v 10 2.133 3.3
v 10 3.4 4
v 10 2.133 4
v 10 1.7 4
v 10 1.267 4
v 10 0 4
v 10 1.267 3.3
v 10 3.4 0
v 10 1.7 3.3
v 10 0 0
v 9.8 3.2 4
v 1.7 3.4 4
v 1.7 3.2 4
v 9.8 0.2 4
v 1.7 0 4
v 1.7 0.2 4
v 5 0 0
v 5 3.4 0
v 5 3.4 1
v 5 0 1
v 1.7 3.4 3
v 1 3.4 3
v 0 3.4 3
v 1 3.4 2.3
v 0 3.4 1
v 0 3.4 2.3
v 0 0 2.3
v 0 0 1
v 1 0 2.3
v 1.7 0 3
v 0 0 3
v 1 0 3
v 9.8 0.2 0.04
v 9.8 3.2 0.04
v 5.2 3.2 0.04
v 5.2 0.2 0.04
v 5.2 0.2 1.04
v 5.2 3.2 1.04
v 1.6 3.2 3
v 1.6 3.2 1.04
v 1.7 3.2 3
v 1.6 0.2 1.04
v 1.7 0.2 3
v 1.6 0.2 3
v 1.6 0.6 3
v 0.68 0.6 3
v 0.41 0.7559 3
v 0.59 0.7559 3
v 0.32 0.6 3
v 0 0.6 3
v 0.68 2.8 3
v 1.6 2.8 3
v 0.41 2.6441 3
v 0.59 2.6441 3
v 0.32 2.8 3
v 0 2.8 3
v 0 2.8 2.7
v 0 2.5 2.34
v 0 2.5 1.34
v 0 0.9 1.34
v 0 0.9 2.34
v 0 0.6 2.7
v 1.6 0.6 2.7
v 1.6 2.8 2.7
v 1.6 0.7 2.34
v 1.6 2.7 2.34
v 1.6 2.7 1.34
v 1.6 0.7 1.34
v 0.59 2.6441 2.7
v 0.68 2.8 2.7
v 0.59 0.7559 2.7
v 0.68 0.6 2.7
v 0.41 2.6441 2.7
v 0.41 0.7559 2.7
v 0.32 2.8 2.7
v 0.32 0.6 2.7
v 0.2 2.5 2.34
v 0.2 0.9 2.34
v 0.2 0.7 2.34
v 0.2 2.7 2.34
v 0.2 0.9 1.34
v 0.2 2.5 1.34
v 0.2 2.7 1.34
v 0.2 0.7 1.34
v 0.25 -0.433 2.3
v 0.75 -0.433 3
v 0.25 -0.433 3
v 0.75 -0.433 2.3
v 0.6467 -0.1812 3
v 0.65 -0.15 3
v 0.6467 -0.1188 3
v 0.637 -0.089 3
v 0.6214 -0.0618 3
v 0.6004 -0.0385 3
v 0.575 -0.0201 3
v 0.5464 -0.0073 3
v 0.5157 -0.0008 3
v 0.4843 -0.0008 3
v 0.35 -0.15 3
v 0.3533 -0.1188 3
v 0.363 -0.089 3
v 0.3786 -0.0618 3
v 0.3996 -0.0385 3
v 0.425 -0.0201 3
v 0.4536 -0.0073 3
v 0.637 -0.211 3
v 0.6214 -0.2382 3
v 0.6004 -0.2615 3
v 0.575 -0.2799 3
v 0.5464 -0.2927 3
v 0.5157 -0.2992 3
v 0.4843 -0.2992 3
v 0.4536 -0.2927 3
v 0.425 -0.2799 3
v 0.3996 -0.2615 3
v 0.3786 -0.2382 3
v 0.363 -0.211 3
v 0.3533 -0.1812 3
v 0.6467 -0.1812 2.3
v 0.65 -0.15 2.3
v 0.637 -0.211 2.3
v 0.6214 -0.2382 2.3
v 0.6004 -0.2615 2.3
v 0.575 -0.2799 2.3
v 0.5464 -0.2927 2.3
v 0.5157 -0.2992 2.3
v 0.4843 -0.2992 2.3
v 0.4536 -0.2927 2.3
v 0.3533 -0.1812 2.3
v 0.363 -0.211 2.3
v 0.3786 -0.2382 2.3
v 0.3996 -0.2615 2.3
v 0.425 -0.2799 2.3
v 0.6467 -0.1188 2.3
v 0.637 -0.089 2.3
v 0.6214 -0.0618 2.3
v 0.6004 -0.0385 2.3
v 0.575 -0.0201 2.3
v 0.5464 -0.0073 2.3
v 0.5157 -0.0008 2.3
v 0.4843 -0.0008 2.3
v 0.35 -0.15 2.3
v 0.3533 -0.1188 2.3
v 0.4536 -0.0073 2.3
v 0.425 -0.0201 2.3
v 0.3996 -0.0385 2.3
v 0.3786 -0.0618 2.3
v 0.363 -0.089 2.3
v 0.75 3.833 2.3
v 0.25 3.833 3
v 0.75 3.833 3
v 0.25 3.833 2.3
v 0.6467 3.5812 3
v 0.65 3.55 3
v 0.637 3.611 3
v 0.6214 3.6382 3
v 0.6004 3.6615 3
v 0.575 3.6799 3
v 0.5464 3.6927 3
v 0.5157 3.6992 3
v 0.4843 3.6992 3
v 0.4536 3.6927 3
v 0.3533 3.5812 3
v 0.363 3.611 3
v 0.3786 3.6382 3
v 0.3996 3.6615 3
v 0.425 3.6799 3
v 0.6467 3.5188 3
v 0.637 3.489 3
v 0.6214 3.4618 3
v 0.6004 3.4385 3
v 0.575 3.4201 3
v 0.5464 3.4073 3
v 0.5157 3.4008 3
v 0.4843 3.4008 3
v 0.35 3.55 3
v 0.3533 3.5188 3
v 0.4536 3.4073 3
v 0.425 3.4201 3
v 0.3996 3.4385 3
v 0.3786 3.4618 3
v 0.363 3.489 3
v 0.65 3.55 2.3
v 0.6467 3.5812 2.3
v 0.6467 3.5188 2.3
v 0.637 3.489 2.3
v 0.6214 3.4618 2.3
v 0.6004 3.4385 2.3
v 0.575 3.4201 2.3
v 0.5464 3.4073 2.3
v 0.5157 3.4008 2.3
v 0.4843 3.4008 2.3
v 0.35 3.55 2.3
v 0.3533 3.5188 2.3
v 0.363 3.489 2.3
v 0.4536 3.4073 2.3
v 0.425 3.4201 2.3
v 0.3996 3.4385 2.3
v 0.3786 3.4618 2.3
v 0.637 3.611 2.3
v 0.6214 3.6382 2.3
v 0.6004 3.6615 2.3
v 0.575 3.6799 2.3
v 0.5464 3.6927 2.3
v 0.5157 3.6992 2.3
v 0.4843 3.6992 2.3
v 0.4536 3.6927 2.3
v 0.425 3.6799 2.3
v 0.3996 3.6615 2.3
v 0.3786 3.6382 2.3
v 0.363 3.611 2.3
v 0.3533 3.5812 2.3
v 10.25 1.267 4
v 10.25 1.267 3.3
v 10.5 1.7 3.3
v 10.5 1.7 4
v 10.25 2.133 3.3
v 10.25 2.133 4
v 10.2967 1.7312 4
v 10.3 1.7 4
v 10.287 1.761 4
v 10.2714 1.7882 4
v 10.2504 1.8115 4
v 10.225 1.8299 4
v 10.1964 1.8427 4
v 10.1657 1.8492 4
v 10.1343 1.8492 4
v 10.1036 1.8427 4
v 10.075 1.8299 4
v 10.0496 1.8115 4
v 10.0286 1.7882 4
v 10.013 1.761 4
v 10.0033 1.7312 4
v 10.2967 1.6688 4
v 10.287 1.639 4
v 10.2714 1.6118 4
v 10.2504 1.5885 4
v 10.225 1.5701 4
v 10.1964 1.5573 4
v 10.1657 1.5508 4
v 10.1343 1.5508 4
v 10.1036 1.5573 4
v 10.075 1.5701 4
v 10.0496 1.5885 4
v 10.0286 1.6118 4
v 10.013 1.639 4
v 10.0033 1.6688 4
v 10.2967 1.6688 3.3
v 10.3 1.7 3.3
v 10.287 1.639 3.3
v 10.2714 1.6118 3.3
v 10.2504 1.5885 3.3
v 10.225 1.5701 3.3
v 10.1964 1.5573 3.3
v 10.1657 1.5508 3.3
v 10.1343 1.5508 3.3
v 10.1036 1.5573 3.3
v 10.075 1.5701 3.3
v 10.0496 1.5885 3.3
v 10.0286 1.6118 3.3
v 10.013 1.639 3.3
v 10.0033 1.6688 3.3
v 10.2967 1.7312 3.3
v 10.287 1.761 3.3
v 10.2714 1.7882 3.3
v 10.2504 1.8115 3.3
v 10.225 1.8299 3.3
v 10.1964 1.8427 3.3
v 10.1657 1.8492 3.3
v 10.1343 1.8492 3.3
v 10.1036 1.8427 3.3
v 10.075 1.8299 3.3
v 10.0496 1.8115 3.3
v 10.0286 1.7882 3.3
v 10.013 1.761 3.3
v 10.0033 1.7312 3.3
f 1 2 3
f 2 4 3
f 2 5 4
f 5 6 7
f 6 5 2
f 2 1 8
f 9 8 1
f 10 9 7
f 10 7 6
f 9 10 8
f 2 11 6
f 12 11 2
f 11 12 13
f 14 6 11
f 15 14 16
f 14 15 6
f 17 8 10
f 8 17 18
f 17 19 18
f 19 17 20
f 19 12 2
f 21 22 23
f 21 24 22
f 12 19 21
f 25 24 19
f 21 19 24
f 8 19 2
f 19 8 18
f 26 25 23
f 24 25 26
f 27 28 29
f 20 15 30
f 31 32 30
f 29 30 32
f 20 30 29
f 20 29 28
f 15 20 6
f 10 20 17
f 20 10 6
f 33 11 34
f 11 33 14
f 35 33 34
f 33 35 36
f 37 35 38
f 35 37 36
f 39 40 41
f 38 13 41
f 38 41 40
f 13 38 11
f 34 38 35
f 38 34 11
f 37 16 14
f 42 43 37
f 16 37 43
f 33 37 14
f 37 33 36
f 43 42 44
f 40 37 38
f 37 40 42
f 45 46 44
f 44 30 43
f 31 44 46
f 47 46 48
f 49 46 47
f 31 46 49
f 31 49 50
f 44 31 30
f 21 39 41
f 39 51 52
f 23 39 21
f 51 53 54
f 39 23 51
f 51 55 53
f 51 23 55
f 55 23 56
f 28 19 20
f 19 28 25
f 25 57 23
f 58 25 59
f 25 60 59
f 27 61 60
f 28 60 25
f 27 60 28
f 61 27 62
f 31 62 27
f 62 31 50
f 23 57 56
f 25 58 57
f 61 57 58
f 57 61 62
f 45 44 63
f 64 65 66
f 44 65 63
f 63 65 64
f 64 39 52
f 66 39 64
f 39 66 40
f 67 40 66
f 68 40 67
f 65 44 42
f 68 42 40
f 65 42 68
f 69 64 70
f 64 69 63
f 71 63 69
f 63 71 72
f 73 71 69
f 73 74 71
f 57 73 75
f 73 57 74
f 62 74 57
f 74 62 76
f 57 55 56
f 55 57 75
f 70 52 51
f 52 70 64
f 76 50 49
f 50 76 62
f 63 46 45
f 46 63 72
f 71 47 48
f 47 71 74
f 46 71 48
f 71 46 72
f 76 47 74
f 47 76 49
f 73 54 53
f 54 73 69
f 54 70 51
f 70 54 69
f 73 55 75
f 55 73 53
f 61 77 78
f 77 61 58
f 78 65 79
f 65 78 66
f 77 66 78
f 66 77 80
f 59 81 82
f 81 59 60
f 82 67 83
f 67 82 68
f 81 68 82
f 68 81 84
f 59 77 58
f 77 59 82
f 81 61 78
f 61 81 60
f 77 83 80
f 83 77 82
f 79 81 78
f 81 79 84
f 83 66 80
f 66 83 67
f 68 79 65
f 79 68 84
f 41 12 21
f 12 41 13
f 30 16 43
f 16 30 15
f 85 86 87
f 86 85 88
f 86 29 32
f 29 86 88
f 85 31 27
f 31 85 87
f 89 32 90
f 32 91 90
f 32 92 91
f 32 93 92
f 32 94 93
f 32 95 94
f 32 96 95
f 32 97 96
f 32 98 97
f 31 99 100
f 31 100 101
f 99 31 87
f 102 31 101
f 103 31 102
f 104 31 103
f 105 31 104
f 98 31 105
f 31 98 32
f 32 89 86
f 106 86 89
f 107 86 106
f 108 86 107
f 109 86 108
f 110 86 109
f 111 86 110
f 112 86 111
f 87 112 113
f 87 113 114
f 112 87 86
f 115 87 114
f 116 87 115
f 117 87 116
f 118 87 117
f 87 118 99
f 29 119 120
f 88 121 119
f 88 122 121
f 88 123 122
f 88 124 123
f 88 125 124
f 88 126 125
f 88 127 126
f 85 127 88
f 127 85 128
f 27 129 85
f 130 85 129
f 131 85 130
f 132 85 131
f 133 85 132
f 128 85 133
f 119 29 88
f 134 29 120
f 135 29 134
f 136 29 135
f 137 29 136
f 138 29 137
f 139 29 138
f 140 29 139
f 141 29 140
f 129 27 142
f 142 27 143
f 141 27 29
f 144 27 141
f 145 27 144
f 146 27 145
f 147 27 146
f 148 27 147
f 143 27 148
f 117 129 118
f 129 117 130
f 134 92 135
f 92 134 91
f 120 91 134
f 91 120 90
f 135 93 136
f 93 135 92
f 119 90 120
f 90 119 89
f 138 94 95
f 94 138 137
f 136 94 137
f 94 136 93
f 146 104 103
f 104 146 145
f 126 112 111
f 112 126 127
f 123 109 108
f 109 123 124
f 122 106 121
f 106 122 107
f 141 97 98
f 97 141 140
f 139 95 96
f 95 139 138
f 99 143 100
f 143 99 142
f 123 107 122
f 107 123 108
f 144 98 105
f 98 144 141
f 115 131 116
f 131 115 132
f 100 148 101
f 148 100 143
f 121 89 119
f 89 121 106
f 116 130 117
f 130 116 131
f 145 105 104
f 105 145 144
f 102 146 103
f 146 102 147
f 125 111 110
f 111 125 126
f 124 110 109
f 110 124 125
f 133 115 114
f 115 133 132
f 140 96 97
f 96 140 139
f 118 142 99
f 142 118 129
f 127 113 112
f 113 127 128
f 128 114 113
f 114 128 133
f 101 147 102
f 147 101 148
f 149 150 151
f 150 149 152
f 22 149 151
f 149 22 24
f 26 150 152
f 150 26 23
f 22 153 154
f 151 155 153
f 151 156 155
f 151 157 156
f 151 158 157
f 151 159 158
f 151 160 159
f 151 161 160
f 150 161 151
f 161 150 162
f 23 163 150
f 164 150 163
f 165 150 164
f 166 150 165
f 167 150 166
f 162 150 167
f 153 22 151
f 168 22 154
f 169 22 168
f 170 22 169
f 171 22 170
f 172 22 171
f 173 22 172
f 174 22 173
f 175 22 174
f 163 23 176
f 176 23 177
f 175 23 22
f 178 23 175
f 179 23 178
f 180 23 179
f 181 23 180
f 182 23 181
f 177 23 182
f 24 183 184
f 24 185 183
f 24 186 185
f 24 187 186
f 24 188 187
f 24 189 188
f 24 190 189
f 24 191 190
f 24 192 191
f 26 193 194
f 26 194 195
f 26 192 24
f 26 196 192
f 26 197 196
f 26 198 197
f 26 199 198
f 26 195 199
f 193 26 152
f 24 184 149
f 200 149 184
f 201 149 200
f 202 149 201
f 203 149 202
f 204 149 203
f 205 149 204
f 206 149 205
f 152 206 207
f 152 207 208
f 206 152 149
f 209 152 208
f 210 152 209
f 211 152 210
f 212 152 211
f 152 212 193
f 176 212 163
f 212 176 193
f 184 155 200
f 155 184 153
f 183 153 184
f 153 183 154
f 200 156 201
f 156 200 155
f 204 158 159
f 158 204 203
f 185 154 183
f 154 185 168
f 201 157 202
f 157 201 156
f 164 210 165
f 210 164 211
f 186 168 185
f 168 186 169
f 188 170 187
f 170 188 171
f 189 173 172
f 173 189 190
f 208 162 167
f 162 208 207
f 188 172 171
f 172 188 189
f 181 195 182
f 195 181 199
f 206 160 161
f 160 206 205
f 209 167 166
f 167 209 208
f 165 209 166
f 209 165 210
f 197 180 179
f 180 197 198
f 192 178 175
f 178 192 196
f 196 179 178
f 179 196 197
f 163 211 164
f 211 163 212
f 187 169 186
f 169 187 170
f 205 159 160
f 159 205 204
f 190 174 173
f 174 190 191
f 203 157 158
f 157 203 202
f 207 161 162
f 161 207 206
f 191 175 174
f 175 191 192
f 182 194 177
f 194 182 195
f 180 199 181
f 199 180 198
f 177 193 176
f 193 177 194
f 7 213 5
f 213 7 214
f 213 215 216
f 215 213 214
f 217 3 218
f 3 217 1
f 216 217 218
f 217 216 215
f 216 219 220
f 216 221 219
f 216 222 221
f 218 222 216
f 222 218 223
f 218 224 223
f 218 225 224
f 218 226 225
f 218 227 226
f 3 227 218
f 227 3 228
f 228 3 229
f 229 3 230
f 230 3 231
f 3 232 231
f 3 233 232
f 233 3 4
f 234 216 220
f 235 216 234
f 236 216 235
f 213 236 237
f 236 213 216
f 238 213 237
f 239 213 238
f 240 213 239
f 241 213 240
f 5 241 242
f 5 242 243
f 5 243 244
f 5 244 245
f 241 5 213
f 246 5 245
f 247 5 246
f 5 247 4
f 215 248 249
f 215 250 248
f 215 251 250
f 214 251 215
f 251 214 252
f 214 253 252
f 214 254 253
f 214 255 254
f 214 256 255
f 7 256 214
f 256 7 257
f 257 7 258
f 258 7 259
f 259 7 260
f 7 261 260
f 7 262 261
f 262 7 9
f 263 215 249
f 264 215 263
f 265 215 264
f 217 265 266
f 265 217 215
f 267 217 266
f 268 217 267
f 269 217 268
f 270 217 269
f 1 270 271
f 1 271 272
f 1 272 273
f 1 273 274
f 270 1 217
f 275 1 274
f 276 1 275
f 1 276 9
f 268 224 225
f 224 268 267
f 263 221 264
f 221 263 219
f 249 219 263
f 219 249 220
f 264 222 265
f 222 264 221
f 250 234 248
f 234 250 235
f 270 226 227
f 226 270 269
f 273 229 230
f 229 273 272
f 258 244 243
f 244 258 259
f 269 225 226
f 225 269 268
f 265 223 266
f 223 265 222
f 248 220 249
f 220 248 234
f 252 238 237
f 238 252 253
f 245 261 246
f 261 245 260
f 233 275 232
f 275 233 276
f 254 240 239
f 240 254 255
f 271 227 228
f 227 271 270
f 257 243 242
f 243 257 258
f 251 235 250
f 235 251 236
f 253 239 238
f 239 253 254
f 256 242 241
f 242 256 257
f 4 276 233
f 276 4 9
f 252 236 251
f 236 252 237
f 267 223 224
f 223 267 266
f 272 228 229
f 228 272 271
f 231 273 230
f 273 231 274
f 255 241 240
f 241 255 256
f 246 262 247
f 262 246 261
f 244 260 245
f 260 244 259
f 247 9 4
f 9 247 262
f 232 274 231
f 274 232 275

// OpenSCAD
//color("azure",0.25) cube([8.7,2.9,4.1]);

module sensor() {
    translate([-6,0,0]) cube([8,2.2,0.2,]);
    translate([0.5,0,0]) cylinder(0.2,r=0.2,false,$fn=6);
    translate([0.5,2.2,0]) cylinder(0.2,r=0.2,false,$fn=6);
}



module bottom() {
    difference() {
        translate([-0.4,-0.2,-1.2]) cube([9  ,2.6,1.1]);
        translate([0   ,0   ,-1  ]) cube([8.4,2.2,1.1]);
        translate([0   ,0   ,-0.2]) sensor();
        translate([3.8 ,-0.2,-1.8]) cube([4.6,2.6,2  ]);
    }
    translate([-0.4,-0.2,-1.0]) cube([3,2.6,0.2]);
    
    difference() {
        translate([3.6,-0.4,-2.2]) cube([5,3  ,2.1]);
        translate([3.8,-0.2,-2.1]) cube([4.6,2.6,2.1]);
        translate([0   ,0   ,-1  ]) cube([8.4,2.2,1.1]);
    }
}

module top() {
    difference() {
        translate([-0.4,-0.2,0]) cube([9  ,2.6,1.4]);
        translate([-0.2,0,-0.04]) cube([9,2.2,1.4]);
        translate([-0.3,1.3,0.4]) cylinder(0.5,0.4,0.5,false,$fn=40);
    }
    difference() {
        translate([3.6,-0.4,0]) cube([5,3  ,1.4]);
        translate([3.8,-0.2,-0.04]) cube([4.6,2.6,1.4]);
        translate([0  ,0   ,-0.04]) cube([8.4,2.2,1.4]);
    }
    
}

module box() {
    // battery box
    difference() {
        translate([5,0,0]) difference() {
            cube([5, 3.4, 4]);
            translate([0.2,0.2,0.04]) cube([4.6, 3, 4]);
        }
        translate([1.4,0.2,1.04]) cube([6, 3, 4]); 
    }
    difference() {
        // sensor mount
        union() {
            difference() {
                translate([0,0,1]) cube([5, 3.4, 2]); 
                translate([1.6,0.2,1.04]) cube([5, 3, 4]);
                translate([-0.2,0.6,2.7]) cube([5, 2.2, 1.6]);
            }
            translate([0.5,0.6,2.7]) cylinder(0.3,r=0.18,false,$fn=6);
            translate([0.5,2.8,2.7]) cylinder(0.3,r=0.18,false,$fn=6);
        
        }
        // usb hole
        translate([-1,0.9,1.34]) cube([5, 1.6, 1]);
        translate([0.2,0.7,1.34]) cube([5, 2, 1]);
    }
    
    difference() {
        translate([1.7,0,3]) cube([4, 3.4, 1]); 
        translate([1.4,0.2,2.8]) cube([6, 3, 2]); 
    }
}

box();
translate([0.5,0,2.65]) difference() {
    cylinder(0.7,0.5,0.5, true, $fn=6);
    translate([0,-0.15,0]) cylinder(4,0.15,0.15, true, $fn=30);
}
translate([0.5,3.4,2.65]) difference() {
    cylinder(0.7,0.5,0.5, true, $fn=6);
    translate([0,0.15,0]) cylinder(4,0.15,0.15, true, $fn=30);
}
translate([10,1.7,3.65]) difference() {
    cylinder(0.7,0.5,0.5, true, $fn=6);
    translate([0.15,0,0]) cylinder(4,0.15,0.15, true, $fn=30);
     translate([-1,-0.5,-0.5]) cube(1,2,5);
}
